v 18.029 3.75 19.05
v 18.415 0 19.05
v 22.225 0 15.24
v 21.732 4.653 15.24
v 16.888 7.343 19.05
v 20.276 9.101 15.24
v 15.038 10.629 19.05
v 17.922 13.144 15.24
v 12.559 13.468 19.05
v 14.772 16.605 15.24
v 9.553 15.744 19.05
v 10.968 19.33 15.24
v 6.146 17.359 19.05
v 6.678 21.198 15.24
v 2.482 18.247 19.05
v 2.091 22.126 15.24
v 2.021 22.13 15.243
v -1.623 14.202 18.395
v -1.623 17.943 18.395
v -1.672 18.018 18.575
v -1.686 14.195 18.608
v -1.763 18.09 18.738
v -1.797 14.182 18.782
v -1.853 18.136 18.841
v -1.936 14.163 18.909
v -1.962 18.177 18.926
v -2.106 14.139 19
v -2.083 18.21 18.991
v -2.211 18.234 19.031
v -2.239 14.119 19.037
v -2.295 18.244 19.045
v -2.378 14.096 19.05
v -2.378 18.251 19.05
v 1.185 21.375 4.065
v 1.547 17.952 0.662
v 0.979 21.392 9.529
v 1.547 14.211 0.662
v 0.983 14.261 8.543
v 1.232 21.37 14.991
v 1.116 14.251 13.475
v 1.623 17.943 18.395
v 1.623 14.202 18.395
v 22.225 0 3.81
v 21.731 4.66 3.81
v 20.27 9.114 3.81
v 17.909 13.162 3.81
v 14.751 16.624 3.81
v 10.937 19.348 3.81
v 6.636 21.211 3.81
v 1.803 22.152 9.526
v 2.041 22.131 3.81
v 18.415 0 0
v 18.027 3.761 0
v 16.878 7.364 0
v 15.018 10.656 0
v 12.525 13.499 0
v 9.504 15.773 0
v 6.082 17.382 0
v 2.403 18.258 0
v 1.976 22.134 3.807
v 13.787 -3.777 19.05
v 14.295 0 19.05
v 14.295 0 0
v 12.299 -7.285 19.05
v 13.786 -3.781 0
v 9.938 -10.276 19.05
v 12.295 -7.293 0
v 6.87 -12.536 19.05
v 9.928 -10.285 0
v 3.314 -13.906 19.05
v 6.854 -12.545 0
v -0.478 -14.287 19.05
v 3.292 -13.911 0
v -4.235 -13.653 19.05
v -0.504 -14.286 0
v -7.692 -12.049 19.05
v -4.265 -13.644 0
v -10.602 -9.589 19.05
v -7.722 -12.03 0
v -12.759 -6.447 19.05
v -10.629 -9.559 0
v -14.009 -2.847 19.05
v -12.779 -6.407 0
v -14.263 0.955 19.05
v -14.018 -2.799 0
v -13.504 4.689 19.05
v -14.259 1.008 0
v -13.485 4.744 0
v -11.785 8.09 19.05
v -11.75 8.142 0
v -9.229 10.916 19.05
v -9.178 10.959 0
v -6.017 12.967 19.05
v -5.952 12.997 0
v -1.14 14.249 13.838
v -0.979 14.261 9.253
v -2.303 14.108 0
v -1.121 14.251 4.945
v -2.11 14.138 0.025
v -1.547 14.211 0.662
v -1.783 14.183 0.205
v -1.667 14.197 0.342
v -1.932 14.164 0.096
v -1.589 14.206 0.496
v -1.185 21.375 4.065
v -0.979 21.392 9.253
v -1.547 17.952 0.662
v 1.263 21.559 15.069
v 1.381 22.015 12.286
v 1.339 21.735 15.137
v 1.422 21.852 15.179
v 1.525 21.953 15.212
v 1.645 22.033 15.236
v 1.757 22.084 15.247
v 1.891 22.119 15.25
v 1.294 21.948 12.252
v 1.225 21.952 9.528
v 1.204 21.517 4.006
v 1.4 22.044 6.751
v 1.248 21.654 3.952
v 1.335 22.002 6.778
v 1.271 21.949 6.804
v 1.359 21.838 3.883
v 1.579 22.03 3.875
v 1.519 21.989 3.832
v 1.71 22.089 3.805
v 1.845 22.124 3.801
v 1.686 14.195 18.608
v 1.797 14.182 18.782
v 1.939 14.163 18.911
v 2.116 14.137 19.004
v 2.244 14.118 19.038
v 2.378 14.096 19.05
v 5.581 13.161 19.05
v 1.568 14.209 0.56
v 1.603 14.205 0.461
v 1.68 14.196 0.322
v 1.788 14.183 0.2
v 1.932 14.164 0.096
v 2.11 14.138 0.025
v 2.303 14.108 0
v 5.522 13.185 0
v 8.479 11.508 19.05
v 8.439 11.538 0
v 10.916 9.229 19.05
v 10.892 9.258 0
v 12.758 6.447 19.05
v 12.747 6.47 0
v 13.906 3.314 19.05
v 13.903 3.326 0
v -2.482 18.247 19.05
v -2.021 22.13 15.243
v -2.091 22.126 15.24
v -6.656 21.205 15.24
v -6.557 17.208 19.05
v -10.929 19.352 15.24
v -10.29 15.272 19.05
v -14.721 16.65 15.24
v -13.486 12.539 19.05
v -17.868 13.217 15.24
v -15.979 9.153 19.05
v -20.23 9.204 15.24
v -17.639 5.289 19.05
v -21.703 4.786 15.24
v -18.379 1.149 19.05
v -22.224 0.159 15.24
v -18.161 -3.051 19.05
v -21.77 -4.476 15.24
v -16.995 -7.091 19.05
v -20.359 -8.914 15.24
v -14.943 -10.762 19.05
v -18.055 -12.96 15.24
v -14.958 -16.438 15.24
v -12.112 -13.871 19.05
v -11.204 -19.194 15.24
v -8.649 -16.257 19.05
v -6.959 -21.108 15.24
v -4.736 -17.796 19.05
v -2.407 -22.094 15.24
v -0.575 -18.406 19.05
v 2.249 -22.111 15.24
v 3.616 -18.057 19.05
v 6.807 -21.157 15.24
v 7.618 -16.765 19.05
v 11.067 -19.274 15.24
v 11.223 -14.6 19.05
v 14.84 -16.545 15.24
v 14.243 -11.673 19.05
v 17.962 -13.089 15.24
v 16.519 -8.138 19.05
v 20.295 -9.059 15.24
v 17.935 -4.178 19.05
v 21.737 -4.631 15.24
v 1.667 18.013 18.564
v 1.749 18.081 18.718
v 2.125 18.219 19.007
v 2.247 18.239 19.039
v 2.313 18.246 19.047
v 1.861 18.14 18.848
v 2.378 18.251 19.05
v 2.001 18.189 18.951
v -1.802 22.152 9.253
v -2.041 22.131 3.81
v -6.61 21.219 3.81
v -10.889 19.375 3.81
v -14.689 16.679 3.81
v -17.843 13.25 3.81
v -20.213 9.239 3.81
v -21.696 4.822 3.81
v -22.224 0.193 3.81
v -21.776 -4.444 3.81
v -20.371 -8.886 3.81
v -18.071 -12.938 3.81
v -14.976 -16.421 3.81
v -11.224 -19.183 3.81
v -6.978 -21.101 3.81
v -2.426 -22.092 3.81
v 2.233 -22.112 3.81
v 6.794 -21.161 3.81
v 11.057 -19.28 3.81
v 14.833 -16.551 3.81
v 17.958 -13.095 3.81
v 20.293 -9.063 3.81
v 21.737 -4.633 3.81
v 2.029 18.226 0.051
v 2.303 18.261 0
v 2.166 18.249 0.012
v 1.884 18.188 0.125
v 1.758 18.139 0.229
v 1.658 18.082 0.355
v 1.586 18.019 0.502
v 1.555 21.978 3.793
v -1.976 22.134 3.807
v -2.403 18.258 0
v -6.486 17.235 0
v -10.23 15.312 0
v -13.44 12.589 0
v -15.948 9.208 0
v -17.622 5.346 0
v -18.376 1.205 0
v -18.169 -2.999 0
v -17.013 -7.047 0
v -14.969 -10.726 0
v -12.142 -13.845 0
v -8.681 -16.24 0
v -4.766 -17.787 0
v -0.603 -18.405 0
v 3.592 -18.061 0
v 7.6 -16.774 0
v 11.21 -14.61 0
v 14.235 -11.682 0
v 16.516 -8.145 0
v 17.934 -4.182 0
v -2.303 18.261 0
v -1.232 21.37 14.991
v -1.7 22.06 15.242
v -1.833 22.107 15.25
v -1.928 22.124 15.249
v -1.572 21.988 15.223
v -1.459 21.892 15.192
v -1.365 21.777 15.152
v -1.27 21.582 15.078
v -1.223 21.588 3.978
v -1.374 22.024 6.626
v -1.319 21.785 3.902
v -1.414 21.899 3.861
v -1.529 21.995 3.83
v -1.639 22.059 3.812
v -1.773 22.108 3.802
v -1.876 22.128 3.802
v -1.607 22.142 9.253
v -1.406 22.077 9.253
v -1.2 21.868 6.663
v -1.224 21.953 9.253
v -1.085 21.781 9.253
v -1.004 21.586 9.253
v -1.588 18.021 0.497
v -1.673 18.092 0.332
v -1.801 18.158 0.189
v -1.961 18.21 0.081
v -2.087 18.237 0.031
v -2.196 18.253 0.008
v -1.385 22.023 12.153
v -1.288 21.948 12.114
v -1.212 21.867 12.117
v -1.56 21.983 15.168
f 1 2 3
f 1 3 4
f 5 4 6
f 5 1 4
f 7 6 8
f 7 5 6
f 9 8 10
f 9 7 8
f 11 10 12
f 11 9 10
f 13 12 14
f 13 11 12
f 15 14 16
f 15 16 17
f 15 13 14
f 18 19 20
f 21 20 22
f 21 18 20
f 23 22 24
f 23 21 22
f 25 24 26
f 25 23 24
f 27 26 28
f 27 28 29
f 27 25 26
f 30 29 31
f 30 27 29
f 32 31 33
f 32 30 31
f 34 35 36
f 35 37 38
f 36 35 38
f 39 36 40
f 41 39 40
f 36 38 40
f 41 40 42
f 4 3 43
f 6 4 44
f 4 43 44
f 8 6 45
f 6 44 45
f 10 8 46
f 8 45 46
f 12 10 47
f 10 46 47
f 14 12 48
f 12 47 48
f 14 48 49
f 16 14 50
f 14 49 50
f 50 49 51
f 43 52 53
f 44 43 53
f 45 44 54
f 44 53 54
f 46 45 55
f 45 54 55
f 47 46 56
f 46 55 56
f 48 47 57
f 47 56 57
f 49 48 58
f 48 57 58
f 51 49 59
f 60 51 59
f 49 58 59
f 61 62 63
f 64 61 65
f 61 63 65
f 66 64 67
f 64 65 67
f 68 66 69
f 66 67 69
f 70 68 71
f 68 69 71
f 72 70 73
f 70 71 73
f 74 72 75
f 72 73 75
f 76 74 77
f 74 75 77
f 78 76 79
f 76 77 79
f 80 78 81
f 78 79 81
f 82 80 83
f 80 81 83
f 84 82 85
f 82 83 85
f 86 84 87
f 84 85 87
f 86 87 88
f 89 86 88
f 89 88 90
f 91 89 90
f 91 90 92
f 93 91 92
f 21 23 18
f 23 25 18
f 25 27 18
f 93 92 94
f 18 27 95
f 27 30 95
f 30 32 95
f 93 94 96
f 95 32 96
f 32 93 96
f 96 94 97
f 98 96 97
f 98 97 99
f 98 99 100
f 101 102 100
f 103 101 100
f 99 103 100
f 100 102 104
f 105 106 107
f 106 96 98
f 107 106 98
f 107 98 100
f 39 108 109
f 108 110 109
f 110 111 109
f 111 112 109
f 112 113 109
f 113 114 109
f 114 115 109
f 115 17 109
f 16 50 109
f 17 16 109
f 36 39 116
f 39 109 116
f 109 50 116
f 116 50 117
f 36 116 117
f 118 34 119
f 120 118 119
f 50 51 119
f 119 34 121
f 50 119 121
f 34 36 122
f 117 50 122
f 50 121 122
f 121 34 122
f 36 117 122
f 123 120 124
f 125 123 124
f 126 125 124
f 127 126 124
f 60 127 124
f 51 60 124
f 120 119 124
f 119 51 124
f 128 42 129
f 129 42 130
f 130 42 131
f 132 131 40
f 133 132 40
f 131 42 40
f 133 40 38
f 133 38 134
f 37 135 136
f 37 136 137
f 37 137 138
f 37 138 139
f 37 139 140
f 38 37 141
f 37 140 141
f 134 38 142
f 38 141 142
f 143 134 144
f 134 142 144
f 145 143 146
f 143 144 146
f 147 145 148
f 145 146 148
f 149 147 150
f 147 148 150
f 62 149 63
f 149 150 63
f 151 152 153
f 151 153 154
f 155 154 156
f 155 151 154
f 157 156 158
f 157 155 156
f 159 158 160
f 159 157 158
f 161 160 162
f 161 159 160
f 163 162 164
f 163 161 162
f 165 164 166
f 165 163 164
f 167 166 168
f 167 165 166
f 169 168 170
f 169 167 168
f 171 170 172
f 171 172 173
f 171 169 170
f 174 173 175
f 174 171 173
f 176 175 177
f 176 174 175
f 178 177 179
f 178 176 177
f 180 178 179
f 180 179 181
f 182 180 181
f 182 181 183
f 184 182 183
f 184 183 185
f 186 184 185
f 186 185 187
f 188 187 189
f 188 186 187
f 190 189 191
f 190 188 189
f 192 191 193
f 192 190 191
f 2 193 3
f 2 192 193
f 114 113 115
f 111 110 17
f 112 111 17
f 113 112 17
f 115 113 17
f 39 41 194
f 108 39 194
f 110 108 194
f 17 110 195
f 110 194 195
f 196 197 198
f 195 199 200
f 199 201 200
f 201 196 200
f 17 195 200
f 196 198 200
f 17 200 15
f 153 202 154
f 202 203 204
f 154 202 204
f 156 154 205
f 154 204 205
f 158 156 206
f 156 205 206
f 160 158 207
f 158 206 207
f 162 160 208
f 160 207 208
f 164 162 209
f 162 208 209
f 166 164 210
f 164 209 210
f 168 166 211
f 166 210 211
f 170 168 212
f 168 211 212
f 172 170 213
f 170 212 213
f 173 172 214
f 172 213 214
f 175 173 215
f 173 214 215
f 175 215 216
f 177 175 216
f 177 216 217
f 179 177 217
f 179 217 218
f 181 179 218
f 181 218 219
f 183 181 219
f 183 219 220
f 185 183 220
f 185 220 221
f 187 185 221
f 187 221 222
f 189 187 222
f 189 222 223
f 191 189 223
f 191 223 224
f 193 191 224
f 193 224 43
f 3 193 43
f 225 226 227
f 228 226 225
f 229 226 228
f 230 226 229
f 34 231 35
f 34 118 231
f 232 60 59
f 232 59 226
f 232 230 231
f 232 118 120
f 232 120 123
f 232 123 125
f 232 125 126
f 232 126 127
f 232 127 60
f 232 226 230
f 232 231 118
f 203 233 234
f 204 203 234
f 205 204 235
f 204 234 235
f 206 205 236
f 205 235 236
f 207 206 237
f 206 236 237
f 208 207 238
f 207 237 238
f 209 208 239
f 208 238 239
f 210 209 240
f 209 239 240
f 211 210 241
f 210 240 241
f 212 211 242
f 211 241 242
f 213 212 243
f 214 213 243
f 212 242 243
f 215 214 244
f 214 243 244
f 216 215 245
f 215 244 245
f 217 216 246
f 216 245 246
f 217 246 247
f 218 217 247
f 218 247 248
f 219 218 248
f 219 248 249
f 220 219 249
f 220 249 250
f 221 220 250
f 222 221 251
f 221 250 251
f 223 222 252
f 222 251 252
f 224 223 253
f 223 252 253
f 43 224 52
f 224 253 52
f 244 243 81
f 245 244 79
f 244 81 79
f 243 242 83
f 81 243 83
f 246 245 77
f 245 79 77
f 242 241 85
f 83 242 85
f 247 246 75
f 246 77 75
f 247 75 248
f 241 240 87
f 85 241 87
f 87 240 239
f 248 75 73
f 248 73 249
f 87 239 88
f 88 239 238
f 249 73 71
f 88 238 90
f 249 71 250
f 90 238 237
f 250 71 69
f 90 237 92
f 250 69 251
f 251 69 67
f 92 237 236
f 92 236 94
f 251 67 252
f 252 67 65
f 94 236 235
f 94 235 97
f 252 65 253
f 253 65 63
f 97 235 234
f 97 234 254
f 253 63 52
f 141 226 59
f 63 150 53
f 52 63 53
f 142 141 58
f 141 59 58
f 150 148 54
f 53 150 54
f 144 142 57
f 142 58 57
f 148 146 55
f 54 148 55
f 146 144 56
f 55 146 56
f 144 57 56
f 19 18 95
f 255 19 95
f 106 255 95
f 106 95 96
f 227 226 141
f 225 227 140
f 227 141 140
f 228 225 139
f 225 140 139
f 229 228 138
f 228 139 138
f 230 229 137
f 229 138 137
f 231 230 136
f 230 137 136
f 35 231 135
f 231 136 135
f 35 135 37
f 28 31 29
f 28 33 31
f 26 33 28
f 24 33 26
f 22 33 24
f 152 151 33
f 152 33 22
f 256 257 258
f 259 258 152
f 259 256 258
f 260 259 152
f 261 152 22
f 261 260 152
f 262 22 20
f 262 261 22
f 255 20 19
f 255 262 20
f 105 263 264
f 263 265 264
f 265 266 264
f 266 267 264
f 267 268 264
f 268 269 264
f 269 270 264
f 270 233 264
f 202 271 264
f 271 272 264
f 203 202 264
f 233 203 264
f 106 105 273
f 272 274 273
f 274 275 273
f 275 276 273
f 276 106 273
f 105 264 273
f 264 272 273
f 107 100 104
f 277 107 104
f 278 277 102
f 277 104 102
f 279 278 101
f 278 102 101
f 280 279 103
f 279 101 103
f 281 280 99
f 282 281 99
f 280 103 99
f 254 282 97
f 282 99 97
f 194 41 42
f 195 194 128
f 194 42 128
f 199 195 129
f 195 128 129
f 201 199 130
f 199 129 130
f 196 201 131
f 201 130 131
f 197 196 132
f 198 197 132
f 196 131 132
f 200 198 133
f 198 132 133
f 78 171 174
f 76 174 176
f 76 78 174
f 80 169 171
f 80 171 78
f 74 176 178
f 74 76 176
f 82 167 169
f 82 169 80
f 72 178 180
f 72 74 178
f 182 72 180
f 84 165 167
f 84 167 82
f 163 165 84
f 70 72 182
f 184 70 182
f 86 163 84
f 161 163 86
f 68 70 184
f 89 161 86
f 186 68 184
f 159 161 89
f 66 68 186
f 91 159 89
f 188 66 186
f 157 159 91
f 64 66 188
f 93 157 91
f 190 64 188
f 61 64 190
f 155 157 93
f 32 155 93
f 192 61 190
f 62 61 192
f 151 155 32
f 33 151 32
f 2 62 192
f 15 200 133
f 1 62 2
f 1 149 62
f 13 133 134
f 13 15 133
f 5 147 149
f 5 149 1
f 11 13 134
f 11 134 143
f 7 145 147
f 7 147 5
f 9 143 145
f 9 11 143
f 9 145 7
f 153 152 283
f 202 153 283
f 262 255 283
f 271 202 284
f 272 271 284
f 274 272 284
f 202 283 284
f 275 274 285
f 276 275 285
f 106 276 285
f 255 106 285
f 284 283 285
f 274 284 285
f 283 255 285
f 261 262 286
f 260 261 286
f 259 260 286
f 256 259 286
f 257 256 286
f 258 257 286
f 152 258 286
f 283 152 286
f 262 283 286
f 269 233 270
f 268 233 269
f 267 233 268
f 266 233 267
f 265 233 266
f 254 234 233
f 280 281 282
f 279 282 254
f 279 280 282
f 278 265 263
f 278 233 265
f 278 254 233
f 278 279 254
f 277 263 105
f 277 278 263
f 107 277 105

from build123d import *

# Parameters (mm, degrees)
F1_DEPTH = 19.05
F2_SIZE  = 3.81
F4_DEPTH = 25.4
F5_R     = 0.762


with BuildPart() as f1:
    # F0 (on Top) → F1 (new body)
    with BuildSketch(Plane.XY):
        with BuildLine():
            ThreePointArc((0.8676202269, 14.2685876747), (10.4102819289, 9.7964988261), (14.2949417309, 0))
            ThreePointArc((14.2949417309, 0), (-9.7964988261, -10.4102819289), (-0.8676202269, 14.2685876747))
            Line((-0.8676202269, 14.2685876747), (-0.8676202269, 22.2080584505))
            ThreePointArc((-0.8676202269, 22.2080584505), (-15.4056445087, -16.019261602), (22.225, 0))
            ThreePointArc((22.225, 0), (16.019261602, 15.4056445087), (0.8676202269, 22.2080584505))
            Line((0.8676202269, 22.2080584505), (0.8676202269, 14.2685876747))
        make_face()
    extrude(amount=F1_DEPTH)

    # F2
    f2_edges = [f1.edges().sort_by_distance(p)[0] for p in [
        (-15.405645, -16.019262, 19.05),
        (-15.405645, -16.019262, 0),
    ]]
    chamfer(f2_edges, length=F2_SIZE)

    # F3 (on Front) → F4 (cut)
    with BuildSketch(Plane.XZ):
        with BuildLine():
            ThreePointArc((2.6717553826, -5.5055550528), (0.9808079105, 9.7828422745), (2.9202771279, 25.0417038096))
            Line((2.9202771279, 25.0417038096), (-2.9202771279, 25.0417038096))
            ThreePointArc((-2.9202771279, 25.0417038096), (-1.465879157, 17.2066583018), (-0.9786513266, 9.2526768707))
            ThreePointArc((-0.9786513266, 9.2526768707), (-1.4033109655, 1.8251602795), (-2.6717553826, -5.5055550528))
            Line((-2.6717553826, -5.5055550528), (2.6717553826, -5.5055550528))
        make_face()
    extrude(amount=-F4_DEPTH, mode=Mode.SUBTRACT)

    # F5
    f5_edges = [f1.edges().sort_by_distance(p)[0] for p in [
        (-1.45887, 20.2631, 17.149451),
        (1.45887, 20.2631, 17.149451),
        (-0.979225, 22.203417, 9.526057),
        (0.979225, 22.203417, 9.526057),
        (1.719324, 16.262865, 19.05),
        (-1.719324, 16.262865, 19.05),
        (-1.394665, 20.267988, 1.900916),
        (-1.638853, 16.271309, 0),
        (1.394665, 20.267988, 1.900916),
        (1.638853, 16.271309, 0),
    ]]
    fillet(f5_edges, radius=F5_R)


solid = f1.part
